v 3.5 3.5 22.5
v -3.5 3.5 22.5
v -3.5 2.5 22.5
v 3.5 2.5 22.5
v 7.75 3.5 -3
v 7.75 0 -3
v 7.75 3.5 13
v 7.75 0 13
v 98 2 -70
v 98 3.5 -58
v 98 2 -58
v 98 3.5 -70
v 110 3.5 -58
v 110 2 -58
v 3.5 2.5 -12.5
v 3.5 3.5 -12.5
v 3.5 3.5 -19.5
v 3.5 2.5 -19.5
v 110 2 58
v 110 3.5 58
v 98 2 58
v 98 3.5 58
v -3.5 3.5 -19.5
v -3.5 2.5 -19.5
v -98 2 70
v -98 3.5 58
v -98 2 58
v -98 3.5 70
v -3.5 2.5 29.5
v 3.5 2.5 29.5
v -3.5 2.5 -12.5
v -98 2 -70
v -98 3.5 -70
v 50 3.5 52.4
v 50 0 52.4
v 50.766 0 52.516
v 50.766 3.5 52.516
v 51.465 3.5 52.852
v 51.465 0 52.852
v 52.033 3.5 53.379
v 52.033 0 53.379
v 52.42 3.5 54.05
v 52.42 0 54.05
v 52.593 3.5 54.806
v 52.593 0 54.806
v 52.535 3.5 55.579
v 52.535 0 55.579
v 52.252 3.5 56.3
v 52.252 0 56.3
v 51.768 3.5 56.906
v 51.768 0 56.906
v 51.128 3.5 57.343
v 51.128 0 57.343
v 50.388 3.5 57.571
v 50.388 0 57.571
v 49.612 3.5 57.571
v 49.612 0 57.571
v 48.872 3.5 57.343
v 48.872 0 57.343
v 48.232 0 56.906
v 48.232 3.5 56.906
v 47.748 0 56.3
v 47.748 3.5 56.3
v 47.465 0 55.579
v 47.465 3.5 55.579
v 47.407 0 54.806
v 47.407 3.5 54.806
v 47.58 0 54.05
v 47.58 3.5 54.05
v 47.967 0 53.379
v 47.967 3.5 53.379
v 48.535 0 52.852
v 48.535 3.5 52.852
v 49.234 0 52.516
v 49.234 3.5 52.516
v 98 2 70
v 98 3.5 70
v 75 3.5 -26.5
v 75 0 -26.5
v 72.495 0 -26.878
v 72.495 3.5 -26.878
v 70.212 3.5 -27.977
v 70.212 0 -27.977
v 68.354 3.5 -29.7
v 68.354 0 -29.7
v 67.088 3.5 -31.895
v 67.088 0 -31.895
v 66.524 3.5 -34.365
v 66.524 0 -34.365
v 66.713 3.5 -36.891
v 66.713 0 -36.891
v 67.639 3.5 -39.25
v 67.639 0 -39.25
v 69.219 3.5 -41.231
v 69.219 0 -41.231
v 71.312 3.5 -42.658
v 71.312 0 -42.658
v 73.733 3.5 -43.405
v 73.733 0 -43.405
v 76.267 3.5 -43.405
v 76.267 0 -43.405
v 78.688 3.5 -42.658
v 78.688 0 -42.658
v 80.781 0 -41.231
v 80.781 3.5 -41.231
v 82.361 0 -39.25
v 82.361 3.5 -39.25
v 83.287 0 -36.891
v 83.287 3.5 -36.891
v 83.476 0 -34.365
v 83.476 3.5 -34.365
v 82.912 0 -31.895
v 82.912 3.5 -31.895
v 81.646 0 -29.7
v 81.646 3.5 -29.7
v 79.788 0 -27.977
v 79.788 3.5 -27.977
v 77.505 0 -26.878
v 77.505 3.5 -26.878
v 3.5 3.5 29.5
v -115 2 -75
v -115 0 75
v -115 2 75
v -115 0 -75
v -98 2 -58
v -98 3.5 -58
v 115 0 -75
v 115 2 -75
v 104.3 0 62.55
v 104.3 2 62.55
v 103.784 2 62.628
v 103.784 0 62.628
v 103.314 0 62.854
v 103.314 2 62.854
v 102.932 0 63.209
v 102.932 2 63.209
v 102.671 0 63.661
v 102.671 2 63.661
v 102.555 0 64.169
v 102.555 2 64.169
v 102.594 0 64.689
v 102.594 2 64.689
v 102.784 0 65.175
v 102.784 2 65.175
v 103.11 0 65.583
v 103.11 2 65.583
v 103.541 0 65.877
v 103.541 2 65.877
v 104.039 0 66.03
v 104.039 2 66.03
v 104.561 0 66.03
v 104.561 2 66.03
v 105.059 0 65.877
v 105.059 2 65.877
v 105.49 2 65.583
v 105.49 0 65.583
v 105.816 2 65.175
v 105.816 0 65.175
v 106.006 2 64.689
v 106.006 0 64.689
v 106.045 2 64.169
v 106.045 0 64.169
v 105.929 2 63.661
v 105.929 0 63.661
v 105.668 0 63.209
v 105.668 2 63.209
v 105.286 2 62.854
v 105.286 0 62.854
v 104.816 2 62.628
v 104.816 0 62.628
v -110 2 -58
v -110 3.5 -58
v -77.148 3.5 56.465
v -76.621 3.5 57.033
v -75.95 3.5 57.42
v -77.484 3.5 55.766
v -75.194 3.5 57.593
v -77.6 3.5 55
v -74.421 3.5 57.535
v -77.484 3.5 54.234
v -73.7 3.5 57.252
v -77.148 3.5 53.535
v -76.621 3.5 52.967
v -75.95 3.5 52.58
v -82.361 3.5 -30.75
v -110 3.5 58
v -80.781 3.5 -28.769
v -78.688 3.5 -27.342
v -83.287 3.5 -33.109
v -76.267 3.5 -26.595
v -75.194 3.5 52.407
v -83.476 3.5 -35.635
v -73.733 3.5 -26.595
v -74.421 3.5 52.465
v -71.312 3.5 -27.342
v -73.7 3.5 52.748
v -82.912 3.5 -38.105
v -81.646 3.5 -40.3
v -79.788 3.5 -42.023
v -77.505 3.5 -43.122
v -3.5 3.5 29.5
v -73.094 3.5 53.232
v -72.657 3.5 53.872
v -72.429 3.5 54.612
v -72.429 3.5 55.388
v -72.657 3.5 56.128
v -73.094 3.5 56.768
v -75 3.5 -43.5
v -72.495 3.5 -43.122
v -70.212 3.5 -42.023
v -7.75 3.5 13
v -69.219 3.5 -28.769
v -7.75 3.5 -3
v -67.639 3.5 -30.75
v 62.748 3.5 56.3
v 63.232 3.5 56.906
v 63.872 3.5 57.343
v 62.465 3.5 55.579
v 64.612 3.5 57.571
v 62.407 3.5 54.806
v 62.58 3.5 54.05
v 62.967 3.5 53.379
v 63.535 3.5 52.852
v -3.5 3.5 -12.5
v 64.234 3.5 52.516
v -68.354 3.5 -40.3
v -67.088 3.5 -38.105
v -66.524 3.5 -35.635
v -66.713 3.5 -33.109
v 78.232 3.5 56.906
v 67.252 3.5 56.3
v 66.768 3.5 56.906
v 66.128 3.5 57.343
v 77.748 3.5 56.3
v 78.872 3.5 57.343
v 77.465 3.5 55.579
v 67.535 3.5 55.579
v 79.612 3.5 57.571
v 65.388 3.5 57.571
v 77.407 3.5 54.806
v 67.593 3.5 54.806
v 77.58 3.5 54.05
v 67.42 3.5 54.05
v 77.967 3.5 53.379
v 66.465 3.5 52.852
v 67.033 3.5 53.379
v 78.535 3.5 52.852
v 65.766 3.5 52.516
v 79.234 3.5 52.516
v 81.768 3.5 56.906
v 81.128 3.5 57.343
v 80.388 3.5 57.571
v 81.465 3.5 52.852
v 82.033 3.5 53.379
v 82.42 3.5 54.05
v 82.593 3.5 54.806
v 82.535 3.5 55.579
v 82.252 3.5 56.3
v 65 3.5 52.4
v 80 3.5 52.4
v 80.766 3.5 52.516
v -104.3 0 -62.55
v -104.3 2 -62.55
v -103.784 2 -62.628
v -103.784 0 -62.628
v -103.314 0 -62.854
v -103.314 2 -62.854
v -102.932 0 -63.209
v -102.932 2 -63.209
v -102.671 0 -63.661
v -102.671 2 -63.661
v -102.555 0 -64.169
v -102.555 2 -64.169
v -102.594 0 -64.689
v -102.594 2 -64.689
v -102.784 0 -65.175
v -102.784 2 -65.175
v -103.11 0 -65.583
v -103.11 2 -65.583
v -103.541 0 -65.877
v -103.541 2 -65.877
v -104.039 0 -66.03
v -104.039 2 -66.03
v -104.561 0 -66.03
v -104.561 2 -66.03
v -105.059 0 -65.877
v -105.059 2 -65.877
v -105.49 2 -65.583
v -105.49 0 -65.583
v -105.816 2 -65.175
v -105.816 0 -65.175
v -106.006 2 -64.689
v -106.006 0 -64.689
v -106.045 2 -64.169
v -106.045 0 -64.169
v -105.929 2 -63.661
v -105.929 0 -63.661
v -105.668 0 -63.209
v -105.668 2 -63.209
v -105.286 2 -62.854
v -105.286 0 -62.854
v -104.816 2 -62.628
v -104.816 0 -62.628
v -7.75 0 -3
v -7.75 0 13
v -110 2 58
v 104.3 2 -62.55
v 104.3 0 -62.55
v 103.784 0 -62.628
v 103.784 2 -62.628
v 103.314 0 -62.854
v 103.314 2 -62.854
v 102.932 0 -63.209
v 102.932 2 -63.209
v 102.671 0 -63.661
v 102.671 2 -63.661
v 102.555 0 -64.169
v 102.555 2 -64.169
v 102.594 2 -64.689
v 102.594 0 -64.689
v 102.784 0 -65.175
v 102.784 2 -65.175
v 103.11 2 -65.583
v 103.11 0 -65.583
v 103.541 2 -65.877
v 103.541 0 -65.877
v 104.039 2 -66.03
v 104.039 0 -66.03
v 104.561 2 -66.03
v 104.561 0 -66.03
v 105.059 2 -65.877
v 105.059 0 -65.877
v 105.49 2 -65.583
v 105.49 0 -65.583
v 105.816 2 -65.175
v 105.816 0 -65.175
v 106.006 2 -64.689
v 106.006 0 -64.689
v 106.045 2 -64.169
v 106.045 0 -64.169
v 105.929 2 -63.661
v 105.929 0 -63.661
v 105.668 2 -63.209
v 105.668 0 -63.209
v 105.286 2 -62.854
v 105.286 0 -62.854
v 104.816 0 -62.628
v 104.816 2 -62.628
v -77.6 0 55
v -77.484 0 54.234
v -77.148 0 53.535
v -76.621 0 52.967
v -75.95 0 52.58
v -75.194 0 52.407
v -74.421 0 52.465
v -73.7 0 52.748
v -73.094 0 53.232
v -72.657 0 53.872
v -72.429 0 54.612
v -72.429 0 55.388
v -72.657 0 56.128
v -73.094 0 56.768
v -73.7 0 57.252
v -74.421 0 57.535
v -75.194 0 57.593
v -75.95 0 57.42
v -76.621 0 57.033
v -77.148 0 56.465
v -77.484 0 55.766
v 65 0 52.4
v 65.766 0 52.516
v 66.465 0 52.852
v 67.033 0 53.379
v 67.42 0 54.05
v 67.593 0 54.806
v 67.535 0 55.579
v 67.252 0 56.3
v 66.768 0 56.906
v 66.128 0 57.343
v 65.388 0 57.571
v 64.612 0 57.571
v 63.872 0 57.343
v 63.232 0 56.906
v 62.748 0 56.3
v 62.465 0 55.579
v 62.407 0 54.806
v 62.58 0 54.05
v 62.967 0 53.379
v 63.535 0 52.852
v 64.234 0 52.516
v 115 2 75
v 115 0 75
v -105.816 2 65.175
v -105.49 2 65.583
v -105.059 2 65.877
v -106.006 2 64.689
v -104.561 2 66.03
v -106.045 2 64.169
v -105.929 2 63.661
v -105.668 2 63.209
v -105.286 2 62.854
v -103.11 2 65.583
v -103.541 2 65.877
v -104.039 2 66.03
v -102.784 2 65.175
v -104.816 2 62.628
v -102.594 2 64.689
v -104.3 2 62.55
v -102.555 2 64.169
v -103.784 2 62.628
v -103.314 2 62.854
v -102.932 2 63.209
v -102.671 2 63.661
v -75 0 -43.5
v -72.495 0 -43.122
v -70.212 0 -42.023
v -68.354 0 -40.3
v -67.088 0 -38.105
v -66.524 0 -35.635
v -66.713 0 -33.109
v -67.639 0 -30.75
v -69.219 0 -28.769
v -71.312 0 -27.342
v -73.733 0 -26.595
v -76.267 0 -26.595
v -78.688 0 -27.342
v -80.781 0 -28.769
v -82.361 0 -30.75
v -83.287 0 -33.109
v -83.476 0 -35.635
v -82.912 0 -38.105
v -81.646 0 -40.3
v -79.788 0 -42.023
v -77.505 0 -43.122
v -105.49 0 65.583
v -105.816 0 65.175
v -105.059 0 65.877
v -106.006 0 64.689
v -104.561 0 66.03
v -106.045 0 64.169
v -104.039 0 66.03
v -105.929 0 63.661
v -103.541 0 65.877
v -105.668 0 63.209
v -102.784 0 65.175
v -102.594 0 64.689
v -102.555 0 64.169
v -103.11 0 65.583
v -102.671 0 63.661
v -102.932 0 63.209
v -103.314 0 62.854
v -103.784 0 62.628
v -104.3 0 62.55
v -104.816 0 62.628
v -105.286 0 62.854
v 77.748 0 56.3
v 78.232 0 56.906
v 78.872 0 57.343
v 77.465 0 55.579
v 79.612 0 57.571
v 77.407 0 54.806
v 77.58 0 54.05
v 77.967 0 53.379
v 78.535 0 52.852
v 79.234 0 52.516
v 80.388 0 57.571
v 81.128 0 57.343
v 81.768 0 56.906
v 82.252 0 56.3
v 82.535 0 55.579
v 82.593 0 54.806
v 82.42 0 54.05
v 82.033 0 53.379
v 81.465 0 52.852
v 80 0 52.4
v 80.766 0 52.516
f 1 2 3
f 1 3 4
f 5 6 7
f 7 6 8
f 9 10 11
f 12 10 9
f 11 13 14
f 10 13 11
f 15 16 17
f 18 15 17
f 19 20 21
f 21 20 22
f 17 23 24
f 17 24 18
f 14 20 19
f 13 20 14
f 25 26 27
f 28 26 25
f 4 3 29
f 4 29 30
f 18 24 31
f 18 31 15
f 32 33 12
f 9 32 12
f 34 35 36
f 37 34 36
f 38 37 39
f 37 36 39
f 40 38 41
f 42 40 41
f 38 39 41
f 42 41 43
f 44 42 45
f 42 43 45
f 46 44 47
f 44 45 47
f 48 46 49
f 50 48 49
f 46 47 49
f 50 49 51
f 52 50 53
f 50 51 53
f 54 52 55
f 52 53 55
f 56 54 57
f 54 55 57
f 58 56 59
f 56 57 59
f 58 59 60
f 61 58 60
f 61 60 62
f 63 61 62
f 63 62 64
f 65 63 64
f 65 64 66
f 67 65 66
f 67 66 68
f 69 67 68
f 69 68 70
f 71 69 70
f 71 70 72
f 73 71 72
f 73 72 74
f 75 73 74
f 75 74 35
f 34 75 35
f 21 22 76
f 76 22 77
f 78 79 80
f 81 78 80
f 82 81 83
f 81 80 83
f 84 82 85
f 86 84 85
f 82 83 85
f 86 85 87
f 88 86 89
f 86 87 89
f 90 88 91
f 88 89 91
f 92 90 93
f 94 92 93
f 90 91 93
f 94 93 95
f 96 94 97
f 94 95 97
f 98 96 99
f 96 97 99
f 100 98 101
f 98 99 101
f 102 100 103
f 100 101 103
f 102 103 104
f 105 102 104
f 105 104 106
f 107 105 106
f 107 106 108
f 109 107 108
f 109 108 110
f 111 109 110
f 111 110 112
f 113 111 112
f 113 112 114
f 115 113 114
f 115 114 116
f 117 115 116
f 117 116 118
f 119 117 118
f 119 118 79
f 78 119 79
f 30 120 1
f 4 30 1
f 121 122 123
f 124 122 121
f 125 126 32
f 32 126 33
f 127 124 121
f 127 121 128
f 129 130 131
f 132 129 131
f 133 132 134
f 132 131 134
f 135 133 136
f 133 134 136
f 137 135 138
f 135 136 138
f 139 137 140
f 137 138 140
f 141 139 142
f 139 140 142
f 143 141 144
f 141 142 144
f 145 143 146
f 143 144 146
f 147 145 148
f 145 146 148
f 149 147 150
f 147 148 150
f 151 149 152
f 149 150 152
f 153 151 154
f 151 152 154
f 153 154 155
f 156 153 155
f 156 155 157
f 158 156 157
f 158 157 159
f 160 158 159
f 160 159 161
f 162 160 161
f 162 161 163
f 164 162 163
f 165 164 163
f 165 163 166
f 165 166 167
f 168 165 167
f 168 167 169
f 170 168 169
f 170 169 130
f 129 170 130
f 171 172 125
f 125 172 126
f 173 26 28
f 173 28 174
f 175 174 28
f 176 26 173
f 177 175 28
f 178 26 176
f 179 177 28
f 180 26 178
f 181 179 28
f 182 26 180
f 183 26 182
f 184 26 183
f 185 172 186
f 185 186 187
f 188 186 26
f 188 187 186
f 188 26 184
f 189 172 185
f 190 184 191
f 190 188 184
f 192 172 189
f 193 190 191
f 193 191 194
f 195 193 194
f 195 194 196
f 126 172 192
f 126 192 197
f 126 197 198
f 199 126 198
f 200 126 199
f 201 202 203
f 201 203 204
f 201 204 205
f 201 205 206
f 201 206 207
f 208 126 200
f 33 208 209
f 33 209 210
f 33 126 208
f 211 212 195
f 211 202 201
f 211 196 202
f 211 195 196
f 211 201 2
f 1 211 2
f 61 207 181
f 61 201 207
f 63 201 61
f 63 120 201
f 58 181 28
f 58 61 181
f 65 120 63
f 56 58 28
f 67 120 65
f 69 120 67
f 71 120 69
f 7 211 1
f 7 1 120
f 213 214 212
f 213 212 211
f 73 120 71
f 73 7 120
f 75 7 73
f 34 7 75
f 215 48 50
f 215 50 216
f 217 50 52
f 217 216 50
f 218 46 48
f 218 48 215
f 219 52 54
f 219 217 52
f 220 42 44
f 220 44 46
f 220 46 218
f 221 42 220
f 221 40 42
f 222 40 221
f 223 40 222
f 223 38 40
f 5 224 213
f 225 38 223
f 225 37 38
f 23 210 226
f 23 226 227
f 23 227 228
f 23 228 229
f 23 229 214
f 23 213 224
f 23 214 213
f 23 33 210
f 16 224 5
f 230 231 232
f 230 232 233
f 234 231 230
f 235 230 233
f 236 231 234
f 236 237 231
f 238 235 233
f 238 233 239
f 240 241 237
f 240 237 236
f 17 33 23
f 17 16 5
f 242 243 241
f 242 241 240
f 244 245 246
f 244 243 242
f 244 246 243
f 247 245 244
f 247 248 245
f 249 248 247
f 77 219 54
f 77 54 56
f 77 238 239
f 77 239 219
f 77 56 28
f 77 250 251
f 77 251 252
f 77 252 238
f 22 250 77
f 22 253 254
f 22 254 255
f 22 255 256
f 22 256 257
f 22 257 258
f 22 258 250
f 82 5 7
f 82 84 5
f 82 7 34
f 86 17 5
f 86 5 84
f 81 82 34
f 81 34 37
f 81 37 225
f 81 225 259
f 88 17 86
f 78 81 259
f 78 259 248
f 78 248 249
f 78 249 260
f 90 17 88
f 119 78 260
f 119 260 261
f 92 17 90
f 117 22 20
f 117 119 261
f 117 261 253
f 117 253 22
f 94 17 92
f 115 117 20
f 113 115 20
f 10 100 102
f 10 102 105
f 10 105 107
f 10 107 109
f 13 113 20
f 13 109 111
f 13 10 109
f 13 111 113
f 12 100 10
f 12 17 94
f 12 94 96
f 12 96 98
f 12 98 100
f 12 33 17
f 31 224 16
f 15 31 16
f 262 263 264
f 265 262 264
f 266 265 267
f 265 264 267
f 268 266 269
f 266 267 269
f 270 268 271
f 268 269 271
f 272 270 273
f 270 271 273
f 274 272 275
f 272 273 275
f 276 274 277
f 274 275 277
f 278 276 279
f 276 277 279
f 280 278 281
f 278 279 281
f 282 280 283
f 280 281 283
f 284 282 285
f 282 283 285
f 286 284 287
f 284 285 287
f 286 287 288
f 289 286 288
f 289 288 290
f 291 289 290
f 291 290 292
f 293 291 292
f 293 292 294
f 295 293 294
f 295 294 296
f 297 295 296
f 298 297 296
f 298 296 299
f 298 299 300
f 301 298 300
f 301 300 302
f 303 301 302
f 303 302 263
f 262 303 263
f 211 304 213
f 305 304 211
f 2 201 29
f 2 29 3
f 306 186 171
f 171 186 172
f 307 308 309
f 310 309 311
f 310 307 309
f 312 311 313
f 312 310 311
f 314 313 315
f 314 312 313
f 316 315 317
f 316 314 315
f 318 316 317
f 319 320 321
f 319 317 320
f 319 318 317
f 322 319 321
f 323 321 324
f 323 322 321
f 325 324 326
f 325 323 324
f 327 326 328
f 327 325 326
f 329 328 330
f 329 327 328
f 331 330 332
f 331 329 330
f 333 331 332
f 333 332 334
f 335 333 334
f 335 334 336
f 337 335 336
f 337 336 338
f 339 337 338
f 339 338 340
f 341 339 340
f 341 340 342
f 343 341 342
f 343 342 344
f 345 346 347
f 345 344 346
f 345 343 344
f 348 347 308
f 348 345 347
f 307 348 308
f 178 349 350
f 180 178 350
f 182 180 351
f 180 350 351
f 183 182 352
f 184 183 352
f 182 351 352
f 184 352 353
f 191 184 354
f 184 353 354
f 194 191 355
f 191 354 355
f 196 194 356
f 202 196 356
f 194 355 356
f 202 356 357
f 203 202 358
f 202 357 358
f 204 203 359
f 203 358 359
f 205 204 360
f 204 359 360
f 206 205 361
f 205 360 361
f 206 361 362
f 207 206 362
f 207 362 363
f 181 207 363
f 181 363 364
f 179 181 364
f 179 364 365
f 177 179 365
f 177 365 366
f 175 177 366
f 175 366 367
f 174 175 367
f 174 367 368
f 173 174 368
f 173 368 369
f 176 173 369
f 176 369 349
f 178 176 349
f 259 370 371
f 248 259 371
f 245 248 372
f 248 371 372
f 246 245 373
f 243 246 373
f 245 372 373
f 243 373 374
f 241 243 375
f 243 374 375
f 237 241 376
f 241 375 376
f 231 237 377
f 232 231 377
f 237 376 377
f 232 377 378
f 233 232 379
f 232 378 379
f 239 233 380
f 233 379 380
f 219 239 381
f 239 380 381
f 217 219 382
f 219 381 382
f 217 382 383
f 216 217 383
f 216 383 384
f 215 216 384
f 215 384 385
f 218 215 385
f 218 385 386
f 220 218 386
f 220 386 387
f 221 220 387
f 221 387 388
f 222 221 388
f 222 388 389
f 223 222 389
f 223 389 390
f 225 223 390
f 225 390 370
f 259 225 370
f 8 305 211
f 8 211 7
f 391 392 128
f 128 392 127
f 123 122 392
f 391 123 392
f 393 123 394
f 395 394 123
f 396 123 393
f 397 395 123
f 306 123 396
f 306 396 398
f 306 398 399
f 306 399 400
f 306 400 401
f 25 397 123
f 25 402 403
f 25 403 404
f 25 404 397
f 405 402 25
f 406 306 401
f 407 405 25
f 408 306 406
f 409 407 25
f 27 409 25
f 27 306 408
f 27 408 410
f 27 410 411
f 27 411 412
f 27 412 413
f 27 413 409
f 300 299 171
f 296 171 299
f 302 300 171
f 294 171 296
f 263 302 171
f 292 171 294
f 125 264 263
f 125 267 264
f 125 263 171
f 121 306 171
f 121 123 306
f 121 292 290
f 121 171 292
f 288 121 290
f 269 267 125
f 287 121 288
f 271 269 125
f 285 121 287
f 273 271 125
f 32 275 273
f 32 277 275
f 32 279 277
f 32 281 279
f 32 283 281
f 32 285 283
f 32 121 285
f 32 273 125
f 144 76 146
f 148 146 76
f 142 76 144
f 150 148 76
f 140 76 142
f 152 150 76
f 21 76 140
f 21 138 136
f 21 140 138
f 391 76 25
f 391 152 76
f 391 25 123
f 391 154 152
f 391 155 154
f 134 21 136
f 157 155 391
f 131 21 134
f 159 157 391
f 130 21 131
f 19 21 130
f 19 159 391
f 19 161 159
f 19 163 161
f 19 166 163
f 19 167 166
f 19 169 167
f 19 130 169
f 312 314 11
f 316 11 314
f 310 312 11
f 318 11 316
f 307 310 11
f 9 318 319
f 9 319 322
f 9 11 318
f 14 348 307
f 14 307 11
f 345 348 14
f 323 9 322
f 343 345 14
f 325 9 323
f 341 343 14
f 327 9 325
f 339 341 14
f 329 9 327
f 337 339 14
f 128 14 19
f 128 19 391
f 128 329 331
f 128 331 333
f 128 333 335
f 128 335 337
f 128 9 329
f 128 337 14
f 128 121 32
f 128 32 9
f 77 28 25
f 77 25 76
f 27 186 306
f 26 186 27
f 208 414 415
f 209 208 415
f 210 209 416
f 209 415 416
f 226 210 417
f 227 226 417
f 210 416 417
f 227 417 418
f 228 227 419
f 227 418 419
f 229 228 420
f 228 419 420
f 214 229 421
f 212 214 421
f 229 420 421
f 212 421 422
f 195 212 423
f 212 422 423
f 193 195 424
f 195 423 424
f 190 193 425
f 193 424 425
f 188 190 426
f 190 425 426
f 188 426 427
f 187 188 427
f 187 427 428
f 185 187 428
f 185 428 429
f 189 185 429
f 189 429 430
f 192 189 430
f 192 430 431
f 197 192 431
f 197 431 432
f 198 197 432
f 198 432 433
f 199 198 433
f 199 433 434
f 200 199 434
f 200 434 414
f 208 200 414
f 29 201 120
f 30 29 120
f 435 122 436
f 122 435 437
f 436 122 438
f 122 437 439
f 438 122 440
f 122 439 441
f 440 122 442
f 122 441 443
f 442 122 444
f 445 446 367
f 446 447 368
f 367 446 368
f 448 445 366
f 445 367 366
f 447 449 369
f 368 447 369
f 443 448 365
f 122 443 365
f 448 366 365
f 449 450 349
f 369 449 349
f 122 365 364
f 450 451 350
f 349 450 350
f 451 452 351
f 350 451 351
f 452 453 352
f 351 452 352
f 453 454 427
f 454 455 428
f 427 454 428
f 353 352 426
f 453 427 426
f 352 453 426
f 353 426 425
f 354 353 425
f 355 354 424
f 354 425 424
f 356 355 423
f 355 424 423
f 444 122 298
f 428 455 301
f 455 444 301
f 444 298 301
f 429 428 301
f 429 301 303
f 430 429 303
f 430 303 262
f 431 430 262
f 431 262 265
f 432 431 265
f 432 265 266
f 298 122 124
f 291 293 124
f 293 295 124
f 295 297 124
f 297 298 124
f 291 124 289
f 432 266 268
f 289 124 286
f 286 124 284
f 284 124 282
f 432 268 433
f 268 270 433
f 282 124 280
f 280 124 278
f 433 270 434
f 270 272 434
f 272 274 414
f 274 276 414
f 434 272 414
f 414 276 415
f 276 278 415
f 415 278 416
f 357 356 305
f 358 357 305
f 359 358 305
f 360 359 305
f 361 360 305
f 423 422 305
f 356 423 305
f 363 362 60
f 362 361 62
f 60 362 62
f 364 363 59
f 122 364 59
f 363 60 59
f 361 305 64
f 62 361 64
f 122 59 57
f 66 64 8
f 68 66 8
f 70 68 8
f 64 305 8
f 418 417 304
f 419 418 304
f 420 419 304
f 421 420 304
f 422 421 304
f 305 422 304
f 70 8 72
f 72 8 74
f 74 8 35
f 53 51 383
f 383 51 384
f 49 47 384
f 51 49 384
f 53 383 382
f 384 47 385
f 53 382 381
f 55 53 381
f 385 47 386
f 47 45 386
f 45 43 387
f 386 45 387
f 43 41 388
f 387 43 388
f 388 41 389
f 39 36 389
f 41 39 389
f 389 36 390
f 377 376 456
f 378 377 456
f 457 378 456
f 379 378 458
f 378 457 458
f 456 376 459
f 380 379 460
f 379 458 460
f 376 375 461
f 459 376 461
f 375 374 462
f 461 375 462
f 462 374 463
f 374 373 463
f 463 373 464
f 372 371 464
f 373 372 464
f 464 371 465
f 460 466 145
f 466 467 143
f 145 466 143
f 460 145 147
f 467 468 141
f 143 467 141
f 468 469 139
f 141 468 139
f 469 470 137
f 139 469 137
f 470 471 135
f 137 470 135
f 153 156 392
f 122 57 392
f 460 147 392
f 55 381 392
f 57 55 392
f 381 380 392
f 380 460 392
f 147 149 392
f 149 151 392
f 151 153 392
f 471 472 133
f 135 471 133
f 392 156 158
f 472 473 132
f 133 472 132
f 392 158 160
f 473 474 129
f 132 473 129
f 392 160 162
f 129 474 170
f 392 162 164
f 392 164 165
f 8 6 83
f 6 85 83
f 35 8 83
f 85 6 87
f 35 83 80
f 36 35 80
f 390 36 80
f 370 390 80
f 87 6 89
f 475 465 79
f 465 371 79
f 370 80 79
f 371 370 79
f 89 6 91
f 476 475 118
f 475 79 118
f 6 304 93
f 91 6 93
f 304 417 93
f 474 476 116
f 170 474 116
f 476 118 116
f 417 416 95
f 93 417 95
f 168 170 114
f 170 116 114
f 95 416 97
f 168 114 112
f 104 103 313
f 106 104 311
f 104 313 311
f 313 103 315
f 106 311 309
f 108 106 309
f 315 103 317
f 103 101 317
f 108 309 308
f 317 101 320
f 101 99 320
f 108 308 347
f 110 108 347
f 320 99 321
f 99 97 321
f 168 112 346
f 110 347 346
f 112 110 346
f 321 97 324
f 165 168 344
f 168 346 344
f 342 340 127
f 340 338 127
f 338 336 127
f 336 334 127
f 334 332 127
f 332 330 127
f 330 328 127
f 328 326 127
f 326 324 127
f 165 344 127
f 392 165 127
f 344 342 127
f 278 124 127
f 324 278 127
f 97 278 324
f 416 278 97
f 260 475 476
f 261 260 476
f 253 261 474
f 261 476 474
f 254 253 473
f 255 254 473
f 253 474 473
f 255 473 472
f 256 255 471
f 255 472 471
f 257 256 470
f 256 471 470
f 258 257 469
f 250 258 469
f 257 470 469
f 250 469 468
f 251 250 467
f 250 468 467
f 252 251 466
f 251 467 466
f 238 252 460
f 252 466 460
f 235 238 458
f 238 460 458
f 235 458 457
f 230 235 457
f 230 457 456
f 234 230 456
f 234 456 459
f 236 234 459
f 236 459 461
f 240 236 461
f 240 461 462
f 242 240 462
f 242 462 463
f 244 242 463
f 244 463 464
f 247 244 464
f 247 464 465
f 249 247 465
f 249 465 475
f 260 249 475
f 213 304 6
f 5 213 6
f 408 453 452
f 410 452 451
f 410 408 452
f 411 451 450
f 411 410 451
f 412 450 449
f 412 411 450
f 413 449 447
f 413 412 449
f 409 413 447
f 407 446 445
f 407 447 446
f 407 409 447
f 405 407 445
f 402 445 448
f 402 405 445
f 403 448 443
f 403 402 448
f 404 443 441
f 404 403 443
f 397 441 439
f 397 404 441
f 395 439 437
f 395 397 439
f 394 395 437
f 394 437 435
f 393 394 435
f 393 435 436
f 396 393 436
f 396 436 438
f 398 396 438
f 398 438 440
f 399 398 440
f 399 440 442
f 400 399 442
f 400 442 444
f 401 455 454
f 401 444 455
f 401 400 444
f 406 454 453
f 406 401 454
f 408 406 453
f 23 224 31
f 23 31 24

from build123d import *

# Parameters (mm, degrees)
SKETCH1_W               = 230
SKETCH1_H               = 150
BOSS_EXTRUDE1_DEPTH     = 3.5
SKETCH4_R               = 8.5
SKETCH4_W               = 15.5
SKETCH4_H               = 16
CUT_EXTRUDE2_DEPTH      = 100
SKETCH2_W               = 230
SKETCH2_H               = 150
SKETCH2_W_2             = 220
SKETCH2_H_2             = 140
CUT_EXTRUDE3_DEPTH      = 1.5
SKETCH5_W               = 12
SKETCH5_H               = 12
SKETCH5_R               = 1.75
CUT_EXTRUDE4_DEPTH      = 1.5
SKETCH7_R               = 1.75
CUT_EXTRUDE5_DEPTH      = 10
MIRROR2_COPY_1_SKETCH_W = 12
MIRROR2_COPY_1_SKETCH_H = 12
MIRROR2_COPY_1_SKETCH_R = 1.75
MIRROR2_COPY_1_DEPTH    = 1.5
MIRROR2_COPY_2_SKETCH_R = 1.75
MIRROR2_COPY_2_DEPTH    = 10
SKETCH8_R               = 2.6
CUT_EXTRUDE6_DEPTH      = 10
SKETCH9_W               = 7
SKETCH9_H               = 7
CUT_EXTRUDE7_DEPTH      = 1


with BuildPart() as part:
    # Sketch1 → Boss-Extrude1 (new body)
    with BuildSketch(Plane(origin=(0, 0, 0), x_dir=(1, 0, 0), z_dir=(0, 1, 0))):
        Rectangle(SKETCH1_W, SKETCH1_H)
    extrude(amount=BOSS_EXTRUDE1_DEPTH)

    # Sketch4 → Cut-Extrude2 (cut)
    with BuildSketch(Plane.XZ):
        with Locations(Location((-75, -35, 0), (0, 0, 270))):
            Circle(SKETCH4_R)
        with Locations(Location((75, -35, 0), (0, 0, 90))):
            Circle(SKETCH4_R)
        with Locations((0, 5)):
            Rectangle(SKETCH4_W, SKETCH4_H)
    extrude(amount=-CUT_EXTRUDE2_DEPTH, mode=Mode.SUBTRACT)

    # Sketch2 → Cut-Extrude3 (cut)
    with BuildSketch(Plane(origin=(0, 3.5, 0), x_dir=(1, 0, 0), z_dir=(0, 1, 0))):
        Rectangle(SKETCH2_W, SKETCH2_H)
        Rectangle(SKETCH2_W_2, SKETCH2_H_2, mode=Mode.SUBTRACT)
    extrude(amount=-CUT_EXTRUDE3_DEPTH, mode=Mode.SUBTRACT)

    # Sketch5 → Cut-Extrude4 (cut)
    with BuildSketch(Plane(origin=(0, 3.5, 0), x_dir=(1, 0, 0), z_dir=(0, 1, 0))):
        with Locations((-104, 64)):
            Rectangle(SKETCH5_W, SKETCH5_H)
        with Locations(Location((-104.3, 64.3, 0), (0, 0, 270))):
            Circle(SKETCH5_R, mode=Mode.SUBTRACT)
    cut_extrude4 = extrude(amount=-CUT_EXTRUDE4_DEPTH, mode=Mode.SUBTRACT)

    # Sketch7 → Cut-Extrude5 (cut)
    with BuildSketch(Plane(origin=(0, 3.5, 0), x_dir=(1, 0, 0), z_dir=(0, 1, 0))):
        with Locations(Location((-104.3, 64.3, 0), (0, 0, 270))):
            Circle(SKETCH7_R)
    cut_extrude5 = extrude(amount=-CUT_EXTRUDE5_DEPTH, mode=Mode.SUBTRACT)

    # Mirror1: Cut-Extrude4, Cut-Extrude5 across plane
    add(cut_extrude4.mirror(Plane(origin=(0, 0, 0), x_dir=(0, 0, 1), z_dir=(1, 0, 0))), mode=Mode.SUBTRACT)
    add(cut_extrude5.mirror(Plane(origin=(0, 0, 0), x_dir=(0, 0, 1), z_dir=(1, 0, 0))), mode=Mode.SUBTRACT)

    # Mirror2: Cut-Extrude4, Cut-Extrude5 across plane
    add(cut_extrude4.mirror(Plane.XY), mode=Mode.SUBTRACT)
    add(cut_extrude5.mirror(Plane.XY), mode=Mode.SUBTRACT)

    # Mirror2 copy 1 sketch → Mirror2 copy 1 (cut)
    with BuildSketch(Plane(origin=(0, 3.5, 0), x_dir=(-1, 0, 0), z_dir=(0, 1, 0))):
        with Locations((-104, 64)):
            Rectangle(MIRROR2_COPY_1_SKETCH_W, MIRROR2_COPY_1_SKETCH_H)
        with Locations(Location((-104.3, 64.3, 0), (0, 0, 270))):
            Circle(MIRROR2_COPY_1_SKETCH_R, mode=Mode.SUBTRACT)
    extrude(amount=-MIRROR2_COPY_1_DEPTH, mode=Mode.SUBTRACT)

    # Mirror2 copy 2 sketch → Mirror2 copy 2 (cut)
    with BuildSketch(Plane(origin=(0, 3.5, 0), x_dir=(-1, 0, 0), z_dir=(0, 1, 0))):
        with Locations(Location((-104.3, 64.3, 0), (0, 0, 270))):
            Circle(MIRROR2_COPY_2_SKETCH_R)
    extrude(amount=-MIRROR2_COPY_2_DEPTH, mode=Mode.SUBTRACT)

    # Sketch8 → Cut-Extrude6 (cut)
    with BuildSketch(Plane.XZ):
        with BuildLine():
            ThreePointArc((-72.4, 55), (-75, 57.6), (-77.6, 55))
            Line((-77.6, 55), (-72.4, 55))
        make_face()
        with BuildLine():
            Line((-72.4, 55), (-77.6, 55))
            ThreePointArc((-77.6, 55), (-75, 52.4), (-72.4, 55))
        make_face()
        with Locations(Location((50, 55, 0), (0, 0, 270))):
            Circle(SKETCH8_R)
        with Locations(Location((65, 55, 0), (0, 0, 270))):
            Circle(SKETCH8_R)
        with Locations(Location((80, 55, 0), (0, 0, 270))):
            Circle(SKETCH8_R)
    extrude(amount=-CUT_EXTRUDE6_DEPTH, mode=Mode.SUBTRACT)

    # Sketch9 → Cut-Extrude7 (cut)
    with BuildSketch(Plane(origin=(0, 3.5, 0), x_dir=(1, 0, 0), z_dir=(0, 1, 0))):
        with Locations((0, 16)):
            Rectangle(SKETCH9_W, SKETCH9_H)
        with Locations((0, -26)):
            Rectangle(SKETCH9_W, SKETCH9_H)
    extrude(amount=-CUT_EXTRUDE7_DEPTH, mode=Mode.SUBTRACT)


solid = part.part
